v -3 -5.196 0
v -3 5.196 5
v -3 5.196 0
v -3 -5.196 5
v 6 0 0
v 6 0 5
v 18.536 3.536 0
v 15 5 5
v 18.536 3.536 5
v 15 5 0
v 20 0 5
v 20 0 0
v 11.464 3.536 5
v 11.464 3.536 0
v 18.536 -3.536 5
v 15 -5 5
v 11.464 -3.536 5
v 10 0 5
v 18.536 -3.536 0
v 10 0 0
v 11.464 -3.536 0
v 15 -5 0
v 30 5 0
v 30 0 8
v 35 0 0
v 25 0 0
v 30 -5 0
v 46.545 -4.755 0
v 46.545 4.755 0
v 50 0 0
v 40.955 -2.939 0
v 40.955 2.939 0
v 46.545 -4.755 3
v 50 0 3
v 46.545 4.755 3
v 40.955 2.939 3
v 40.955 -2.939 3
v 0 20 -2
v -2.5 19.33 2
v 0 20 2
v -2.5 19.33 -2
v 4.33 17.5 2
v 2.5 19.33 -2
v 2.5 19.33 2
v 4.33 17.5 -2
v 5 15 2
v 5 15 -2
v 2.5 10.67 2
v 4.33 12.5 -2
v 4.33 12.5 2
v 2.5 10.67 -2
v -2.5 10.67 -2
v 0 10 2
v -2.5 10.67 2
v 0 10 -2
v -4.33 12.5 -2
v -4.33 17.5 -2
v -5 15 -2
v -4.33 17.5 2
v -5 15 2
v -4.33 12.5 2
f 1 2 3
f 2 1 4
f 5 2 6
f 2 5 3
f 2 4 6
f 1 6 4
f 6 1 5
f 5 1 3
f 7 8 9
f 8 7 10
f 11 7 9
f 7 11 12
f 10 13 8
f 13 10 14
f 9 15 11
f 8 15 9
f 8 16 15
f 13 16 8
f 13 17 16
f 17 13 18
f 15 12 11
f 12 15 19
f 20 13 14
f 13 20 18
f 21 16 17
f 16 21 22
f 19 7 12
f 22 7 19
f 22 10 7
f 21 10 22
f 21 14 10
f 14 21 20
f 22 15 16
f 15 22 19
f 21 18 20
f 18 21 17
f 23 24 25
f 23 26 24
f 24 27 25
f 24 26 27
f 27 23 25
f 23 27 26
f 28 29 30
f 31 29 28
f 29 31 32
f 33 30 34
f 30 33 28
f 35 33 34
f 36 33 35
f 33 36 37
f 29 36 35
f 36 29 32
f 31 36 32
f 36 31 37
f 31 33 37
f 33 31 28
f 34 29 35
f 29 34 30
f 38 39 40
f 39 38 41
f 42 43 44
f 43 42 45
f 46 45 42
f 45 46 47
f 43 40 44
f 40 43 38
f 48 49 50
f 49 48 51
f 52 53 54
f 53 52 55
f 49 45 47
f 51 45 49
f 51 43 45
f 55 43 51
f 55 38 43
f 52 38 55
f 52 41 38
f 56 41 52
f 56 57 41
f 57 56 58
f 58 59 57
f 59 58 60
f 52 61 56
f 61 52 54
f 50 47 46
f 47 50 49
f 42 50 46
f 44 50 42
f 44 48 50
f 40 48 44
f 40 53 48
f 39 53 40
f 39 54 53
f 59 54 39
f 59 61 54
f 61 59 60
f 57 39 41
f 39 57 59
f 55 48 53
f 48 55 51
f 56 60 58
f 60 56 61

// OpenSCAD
// Zweck: $fn = 3…12 am Aufruf ergibt Polygone wie in OpenSCAD – Dreieck, Achteck, Pyramide, 2D-Fünfeck.
cylinder(h = 5, r = 6, $fn = 3);
translate([15, 0, 0]) cylinder(h = 5, d = 10, $fn = 8);
translate([30, 0, 0]) cylinder(h = 8, r1 = 5, r2 = 0, $fn = 4);
translate([45, 0, 0]) linear_extrude(height = 3) circle(r = 5, $fn = 5);
translate([0, 15, 0]) cylinder(h = 4, r = 5, center = true, $fn = 12);
